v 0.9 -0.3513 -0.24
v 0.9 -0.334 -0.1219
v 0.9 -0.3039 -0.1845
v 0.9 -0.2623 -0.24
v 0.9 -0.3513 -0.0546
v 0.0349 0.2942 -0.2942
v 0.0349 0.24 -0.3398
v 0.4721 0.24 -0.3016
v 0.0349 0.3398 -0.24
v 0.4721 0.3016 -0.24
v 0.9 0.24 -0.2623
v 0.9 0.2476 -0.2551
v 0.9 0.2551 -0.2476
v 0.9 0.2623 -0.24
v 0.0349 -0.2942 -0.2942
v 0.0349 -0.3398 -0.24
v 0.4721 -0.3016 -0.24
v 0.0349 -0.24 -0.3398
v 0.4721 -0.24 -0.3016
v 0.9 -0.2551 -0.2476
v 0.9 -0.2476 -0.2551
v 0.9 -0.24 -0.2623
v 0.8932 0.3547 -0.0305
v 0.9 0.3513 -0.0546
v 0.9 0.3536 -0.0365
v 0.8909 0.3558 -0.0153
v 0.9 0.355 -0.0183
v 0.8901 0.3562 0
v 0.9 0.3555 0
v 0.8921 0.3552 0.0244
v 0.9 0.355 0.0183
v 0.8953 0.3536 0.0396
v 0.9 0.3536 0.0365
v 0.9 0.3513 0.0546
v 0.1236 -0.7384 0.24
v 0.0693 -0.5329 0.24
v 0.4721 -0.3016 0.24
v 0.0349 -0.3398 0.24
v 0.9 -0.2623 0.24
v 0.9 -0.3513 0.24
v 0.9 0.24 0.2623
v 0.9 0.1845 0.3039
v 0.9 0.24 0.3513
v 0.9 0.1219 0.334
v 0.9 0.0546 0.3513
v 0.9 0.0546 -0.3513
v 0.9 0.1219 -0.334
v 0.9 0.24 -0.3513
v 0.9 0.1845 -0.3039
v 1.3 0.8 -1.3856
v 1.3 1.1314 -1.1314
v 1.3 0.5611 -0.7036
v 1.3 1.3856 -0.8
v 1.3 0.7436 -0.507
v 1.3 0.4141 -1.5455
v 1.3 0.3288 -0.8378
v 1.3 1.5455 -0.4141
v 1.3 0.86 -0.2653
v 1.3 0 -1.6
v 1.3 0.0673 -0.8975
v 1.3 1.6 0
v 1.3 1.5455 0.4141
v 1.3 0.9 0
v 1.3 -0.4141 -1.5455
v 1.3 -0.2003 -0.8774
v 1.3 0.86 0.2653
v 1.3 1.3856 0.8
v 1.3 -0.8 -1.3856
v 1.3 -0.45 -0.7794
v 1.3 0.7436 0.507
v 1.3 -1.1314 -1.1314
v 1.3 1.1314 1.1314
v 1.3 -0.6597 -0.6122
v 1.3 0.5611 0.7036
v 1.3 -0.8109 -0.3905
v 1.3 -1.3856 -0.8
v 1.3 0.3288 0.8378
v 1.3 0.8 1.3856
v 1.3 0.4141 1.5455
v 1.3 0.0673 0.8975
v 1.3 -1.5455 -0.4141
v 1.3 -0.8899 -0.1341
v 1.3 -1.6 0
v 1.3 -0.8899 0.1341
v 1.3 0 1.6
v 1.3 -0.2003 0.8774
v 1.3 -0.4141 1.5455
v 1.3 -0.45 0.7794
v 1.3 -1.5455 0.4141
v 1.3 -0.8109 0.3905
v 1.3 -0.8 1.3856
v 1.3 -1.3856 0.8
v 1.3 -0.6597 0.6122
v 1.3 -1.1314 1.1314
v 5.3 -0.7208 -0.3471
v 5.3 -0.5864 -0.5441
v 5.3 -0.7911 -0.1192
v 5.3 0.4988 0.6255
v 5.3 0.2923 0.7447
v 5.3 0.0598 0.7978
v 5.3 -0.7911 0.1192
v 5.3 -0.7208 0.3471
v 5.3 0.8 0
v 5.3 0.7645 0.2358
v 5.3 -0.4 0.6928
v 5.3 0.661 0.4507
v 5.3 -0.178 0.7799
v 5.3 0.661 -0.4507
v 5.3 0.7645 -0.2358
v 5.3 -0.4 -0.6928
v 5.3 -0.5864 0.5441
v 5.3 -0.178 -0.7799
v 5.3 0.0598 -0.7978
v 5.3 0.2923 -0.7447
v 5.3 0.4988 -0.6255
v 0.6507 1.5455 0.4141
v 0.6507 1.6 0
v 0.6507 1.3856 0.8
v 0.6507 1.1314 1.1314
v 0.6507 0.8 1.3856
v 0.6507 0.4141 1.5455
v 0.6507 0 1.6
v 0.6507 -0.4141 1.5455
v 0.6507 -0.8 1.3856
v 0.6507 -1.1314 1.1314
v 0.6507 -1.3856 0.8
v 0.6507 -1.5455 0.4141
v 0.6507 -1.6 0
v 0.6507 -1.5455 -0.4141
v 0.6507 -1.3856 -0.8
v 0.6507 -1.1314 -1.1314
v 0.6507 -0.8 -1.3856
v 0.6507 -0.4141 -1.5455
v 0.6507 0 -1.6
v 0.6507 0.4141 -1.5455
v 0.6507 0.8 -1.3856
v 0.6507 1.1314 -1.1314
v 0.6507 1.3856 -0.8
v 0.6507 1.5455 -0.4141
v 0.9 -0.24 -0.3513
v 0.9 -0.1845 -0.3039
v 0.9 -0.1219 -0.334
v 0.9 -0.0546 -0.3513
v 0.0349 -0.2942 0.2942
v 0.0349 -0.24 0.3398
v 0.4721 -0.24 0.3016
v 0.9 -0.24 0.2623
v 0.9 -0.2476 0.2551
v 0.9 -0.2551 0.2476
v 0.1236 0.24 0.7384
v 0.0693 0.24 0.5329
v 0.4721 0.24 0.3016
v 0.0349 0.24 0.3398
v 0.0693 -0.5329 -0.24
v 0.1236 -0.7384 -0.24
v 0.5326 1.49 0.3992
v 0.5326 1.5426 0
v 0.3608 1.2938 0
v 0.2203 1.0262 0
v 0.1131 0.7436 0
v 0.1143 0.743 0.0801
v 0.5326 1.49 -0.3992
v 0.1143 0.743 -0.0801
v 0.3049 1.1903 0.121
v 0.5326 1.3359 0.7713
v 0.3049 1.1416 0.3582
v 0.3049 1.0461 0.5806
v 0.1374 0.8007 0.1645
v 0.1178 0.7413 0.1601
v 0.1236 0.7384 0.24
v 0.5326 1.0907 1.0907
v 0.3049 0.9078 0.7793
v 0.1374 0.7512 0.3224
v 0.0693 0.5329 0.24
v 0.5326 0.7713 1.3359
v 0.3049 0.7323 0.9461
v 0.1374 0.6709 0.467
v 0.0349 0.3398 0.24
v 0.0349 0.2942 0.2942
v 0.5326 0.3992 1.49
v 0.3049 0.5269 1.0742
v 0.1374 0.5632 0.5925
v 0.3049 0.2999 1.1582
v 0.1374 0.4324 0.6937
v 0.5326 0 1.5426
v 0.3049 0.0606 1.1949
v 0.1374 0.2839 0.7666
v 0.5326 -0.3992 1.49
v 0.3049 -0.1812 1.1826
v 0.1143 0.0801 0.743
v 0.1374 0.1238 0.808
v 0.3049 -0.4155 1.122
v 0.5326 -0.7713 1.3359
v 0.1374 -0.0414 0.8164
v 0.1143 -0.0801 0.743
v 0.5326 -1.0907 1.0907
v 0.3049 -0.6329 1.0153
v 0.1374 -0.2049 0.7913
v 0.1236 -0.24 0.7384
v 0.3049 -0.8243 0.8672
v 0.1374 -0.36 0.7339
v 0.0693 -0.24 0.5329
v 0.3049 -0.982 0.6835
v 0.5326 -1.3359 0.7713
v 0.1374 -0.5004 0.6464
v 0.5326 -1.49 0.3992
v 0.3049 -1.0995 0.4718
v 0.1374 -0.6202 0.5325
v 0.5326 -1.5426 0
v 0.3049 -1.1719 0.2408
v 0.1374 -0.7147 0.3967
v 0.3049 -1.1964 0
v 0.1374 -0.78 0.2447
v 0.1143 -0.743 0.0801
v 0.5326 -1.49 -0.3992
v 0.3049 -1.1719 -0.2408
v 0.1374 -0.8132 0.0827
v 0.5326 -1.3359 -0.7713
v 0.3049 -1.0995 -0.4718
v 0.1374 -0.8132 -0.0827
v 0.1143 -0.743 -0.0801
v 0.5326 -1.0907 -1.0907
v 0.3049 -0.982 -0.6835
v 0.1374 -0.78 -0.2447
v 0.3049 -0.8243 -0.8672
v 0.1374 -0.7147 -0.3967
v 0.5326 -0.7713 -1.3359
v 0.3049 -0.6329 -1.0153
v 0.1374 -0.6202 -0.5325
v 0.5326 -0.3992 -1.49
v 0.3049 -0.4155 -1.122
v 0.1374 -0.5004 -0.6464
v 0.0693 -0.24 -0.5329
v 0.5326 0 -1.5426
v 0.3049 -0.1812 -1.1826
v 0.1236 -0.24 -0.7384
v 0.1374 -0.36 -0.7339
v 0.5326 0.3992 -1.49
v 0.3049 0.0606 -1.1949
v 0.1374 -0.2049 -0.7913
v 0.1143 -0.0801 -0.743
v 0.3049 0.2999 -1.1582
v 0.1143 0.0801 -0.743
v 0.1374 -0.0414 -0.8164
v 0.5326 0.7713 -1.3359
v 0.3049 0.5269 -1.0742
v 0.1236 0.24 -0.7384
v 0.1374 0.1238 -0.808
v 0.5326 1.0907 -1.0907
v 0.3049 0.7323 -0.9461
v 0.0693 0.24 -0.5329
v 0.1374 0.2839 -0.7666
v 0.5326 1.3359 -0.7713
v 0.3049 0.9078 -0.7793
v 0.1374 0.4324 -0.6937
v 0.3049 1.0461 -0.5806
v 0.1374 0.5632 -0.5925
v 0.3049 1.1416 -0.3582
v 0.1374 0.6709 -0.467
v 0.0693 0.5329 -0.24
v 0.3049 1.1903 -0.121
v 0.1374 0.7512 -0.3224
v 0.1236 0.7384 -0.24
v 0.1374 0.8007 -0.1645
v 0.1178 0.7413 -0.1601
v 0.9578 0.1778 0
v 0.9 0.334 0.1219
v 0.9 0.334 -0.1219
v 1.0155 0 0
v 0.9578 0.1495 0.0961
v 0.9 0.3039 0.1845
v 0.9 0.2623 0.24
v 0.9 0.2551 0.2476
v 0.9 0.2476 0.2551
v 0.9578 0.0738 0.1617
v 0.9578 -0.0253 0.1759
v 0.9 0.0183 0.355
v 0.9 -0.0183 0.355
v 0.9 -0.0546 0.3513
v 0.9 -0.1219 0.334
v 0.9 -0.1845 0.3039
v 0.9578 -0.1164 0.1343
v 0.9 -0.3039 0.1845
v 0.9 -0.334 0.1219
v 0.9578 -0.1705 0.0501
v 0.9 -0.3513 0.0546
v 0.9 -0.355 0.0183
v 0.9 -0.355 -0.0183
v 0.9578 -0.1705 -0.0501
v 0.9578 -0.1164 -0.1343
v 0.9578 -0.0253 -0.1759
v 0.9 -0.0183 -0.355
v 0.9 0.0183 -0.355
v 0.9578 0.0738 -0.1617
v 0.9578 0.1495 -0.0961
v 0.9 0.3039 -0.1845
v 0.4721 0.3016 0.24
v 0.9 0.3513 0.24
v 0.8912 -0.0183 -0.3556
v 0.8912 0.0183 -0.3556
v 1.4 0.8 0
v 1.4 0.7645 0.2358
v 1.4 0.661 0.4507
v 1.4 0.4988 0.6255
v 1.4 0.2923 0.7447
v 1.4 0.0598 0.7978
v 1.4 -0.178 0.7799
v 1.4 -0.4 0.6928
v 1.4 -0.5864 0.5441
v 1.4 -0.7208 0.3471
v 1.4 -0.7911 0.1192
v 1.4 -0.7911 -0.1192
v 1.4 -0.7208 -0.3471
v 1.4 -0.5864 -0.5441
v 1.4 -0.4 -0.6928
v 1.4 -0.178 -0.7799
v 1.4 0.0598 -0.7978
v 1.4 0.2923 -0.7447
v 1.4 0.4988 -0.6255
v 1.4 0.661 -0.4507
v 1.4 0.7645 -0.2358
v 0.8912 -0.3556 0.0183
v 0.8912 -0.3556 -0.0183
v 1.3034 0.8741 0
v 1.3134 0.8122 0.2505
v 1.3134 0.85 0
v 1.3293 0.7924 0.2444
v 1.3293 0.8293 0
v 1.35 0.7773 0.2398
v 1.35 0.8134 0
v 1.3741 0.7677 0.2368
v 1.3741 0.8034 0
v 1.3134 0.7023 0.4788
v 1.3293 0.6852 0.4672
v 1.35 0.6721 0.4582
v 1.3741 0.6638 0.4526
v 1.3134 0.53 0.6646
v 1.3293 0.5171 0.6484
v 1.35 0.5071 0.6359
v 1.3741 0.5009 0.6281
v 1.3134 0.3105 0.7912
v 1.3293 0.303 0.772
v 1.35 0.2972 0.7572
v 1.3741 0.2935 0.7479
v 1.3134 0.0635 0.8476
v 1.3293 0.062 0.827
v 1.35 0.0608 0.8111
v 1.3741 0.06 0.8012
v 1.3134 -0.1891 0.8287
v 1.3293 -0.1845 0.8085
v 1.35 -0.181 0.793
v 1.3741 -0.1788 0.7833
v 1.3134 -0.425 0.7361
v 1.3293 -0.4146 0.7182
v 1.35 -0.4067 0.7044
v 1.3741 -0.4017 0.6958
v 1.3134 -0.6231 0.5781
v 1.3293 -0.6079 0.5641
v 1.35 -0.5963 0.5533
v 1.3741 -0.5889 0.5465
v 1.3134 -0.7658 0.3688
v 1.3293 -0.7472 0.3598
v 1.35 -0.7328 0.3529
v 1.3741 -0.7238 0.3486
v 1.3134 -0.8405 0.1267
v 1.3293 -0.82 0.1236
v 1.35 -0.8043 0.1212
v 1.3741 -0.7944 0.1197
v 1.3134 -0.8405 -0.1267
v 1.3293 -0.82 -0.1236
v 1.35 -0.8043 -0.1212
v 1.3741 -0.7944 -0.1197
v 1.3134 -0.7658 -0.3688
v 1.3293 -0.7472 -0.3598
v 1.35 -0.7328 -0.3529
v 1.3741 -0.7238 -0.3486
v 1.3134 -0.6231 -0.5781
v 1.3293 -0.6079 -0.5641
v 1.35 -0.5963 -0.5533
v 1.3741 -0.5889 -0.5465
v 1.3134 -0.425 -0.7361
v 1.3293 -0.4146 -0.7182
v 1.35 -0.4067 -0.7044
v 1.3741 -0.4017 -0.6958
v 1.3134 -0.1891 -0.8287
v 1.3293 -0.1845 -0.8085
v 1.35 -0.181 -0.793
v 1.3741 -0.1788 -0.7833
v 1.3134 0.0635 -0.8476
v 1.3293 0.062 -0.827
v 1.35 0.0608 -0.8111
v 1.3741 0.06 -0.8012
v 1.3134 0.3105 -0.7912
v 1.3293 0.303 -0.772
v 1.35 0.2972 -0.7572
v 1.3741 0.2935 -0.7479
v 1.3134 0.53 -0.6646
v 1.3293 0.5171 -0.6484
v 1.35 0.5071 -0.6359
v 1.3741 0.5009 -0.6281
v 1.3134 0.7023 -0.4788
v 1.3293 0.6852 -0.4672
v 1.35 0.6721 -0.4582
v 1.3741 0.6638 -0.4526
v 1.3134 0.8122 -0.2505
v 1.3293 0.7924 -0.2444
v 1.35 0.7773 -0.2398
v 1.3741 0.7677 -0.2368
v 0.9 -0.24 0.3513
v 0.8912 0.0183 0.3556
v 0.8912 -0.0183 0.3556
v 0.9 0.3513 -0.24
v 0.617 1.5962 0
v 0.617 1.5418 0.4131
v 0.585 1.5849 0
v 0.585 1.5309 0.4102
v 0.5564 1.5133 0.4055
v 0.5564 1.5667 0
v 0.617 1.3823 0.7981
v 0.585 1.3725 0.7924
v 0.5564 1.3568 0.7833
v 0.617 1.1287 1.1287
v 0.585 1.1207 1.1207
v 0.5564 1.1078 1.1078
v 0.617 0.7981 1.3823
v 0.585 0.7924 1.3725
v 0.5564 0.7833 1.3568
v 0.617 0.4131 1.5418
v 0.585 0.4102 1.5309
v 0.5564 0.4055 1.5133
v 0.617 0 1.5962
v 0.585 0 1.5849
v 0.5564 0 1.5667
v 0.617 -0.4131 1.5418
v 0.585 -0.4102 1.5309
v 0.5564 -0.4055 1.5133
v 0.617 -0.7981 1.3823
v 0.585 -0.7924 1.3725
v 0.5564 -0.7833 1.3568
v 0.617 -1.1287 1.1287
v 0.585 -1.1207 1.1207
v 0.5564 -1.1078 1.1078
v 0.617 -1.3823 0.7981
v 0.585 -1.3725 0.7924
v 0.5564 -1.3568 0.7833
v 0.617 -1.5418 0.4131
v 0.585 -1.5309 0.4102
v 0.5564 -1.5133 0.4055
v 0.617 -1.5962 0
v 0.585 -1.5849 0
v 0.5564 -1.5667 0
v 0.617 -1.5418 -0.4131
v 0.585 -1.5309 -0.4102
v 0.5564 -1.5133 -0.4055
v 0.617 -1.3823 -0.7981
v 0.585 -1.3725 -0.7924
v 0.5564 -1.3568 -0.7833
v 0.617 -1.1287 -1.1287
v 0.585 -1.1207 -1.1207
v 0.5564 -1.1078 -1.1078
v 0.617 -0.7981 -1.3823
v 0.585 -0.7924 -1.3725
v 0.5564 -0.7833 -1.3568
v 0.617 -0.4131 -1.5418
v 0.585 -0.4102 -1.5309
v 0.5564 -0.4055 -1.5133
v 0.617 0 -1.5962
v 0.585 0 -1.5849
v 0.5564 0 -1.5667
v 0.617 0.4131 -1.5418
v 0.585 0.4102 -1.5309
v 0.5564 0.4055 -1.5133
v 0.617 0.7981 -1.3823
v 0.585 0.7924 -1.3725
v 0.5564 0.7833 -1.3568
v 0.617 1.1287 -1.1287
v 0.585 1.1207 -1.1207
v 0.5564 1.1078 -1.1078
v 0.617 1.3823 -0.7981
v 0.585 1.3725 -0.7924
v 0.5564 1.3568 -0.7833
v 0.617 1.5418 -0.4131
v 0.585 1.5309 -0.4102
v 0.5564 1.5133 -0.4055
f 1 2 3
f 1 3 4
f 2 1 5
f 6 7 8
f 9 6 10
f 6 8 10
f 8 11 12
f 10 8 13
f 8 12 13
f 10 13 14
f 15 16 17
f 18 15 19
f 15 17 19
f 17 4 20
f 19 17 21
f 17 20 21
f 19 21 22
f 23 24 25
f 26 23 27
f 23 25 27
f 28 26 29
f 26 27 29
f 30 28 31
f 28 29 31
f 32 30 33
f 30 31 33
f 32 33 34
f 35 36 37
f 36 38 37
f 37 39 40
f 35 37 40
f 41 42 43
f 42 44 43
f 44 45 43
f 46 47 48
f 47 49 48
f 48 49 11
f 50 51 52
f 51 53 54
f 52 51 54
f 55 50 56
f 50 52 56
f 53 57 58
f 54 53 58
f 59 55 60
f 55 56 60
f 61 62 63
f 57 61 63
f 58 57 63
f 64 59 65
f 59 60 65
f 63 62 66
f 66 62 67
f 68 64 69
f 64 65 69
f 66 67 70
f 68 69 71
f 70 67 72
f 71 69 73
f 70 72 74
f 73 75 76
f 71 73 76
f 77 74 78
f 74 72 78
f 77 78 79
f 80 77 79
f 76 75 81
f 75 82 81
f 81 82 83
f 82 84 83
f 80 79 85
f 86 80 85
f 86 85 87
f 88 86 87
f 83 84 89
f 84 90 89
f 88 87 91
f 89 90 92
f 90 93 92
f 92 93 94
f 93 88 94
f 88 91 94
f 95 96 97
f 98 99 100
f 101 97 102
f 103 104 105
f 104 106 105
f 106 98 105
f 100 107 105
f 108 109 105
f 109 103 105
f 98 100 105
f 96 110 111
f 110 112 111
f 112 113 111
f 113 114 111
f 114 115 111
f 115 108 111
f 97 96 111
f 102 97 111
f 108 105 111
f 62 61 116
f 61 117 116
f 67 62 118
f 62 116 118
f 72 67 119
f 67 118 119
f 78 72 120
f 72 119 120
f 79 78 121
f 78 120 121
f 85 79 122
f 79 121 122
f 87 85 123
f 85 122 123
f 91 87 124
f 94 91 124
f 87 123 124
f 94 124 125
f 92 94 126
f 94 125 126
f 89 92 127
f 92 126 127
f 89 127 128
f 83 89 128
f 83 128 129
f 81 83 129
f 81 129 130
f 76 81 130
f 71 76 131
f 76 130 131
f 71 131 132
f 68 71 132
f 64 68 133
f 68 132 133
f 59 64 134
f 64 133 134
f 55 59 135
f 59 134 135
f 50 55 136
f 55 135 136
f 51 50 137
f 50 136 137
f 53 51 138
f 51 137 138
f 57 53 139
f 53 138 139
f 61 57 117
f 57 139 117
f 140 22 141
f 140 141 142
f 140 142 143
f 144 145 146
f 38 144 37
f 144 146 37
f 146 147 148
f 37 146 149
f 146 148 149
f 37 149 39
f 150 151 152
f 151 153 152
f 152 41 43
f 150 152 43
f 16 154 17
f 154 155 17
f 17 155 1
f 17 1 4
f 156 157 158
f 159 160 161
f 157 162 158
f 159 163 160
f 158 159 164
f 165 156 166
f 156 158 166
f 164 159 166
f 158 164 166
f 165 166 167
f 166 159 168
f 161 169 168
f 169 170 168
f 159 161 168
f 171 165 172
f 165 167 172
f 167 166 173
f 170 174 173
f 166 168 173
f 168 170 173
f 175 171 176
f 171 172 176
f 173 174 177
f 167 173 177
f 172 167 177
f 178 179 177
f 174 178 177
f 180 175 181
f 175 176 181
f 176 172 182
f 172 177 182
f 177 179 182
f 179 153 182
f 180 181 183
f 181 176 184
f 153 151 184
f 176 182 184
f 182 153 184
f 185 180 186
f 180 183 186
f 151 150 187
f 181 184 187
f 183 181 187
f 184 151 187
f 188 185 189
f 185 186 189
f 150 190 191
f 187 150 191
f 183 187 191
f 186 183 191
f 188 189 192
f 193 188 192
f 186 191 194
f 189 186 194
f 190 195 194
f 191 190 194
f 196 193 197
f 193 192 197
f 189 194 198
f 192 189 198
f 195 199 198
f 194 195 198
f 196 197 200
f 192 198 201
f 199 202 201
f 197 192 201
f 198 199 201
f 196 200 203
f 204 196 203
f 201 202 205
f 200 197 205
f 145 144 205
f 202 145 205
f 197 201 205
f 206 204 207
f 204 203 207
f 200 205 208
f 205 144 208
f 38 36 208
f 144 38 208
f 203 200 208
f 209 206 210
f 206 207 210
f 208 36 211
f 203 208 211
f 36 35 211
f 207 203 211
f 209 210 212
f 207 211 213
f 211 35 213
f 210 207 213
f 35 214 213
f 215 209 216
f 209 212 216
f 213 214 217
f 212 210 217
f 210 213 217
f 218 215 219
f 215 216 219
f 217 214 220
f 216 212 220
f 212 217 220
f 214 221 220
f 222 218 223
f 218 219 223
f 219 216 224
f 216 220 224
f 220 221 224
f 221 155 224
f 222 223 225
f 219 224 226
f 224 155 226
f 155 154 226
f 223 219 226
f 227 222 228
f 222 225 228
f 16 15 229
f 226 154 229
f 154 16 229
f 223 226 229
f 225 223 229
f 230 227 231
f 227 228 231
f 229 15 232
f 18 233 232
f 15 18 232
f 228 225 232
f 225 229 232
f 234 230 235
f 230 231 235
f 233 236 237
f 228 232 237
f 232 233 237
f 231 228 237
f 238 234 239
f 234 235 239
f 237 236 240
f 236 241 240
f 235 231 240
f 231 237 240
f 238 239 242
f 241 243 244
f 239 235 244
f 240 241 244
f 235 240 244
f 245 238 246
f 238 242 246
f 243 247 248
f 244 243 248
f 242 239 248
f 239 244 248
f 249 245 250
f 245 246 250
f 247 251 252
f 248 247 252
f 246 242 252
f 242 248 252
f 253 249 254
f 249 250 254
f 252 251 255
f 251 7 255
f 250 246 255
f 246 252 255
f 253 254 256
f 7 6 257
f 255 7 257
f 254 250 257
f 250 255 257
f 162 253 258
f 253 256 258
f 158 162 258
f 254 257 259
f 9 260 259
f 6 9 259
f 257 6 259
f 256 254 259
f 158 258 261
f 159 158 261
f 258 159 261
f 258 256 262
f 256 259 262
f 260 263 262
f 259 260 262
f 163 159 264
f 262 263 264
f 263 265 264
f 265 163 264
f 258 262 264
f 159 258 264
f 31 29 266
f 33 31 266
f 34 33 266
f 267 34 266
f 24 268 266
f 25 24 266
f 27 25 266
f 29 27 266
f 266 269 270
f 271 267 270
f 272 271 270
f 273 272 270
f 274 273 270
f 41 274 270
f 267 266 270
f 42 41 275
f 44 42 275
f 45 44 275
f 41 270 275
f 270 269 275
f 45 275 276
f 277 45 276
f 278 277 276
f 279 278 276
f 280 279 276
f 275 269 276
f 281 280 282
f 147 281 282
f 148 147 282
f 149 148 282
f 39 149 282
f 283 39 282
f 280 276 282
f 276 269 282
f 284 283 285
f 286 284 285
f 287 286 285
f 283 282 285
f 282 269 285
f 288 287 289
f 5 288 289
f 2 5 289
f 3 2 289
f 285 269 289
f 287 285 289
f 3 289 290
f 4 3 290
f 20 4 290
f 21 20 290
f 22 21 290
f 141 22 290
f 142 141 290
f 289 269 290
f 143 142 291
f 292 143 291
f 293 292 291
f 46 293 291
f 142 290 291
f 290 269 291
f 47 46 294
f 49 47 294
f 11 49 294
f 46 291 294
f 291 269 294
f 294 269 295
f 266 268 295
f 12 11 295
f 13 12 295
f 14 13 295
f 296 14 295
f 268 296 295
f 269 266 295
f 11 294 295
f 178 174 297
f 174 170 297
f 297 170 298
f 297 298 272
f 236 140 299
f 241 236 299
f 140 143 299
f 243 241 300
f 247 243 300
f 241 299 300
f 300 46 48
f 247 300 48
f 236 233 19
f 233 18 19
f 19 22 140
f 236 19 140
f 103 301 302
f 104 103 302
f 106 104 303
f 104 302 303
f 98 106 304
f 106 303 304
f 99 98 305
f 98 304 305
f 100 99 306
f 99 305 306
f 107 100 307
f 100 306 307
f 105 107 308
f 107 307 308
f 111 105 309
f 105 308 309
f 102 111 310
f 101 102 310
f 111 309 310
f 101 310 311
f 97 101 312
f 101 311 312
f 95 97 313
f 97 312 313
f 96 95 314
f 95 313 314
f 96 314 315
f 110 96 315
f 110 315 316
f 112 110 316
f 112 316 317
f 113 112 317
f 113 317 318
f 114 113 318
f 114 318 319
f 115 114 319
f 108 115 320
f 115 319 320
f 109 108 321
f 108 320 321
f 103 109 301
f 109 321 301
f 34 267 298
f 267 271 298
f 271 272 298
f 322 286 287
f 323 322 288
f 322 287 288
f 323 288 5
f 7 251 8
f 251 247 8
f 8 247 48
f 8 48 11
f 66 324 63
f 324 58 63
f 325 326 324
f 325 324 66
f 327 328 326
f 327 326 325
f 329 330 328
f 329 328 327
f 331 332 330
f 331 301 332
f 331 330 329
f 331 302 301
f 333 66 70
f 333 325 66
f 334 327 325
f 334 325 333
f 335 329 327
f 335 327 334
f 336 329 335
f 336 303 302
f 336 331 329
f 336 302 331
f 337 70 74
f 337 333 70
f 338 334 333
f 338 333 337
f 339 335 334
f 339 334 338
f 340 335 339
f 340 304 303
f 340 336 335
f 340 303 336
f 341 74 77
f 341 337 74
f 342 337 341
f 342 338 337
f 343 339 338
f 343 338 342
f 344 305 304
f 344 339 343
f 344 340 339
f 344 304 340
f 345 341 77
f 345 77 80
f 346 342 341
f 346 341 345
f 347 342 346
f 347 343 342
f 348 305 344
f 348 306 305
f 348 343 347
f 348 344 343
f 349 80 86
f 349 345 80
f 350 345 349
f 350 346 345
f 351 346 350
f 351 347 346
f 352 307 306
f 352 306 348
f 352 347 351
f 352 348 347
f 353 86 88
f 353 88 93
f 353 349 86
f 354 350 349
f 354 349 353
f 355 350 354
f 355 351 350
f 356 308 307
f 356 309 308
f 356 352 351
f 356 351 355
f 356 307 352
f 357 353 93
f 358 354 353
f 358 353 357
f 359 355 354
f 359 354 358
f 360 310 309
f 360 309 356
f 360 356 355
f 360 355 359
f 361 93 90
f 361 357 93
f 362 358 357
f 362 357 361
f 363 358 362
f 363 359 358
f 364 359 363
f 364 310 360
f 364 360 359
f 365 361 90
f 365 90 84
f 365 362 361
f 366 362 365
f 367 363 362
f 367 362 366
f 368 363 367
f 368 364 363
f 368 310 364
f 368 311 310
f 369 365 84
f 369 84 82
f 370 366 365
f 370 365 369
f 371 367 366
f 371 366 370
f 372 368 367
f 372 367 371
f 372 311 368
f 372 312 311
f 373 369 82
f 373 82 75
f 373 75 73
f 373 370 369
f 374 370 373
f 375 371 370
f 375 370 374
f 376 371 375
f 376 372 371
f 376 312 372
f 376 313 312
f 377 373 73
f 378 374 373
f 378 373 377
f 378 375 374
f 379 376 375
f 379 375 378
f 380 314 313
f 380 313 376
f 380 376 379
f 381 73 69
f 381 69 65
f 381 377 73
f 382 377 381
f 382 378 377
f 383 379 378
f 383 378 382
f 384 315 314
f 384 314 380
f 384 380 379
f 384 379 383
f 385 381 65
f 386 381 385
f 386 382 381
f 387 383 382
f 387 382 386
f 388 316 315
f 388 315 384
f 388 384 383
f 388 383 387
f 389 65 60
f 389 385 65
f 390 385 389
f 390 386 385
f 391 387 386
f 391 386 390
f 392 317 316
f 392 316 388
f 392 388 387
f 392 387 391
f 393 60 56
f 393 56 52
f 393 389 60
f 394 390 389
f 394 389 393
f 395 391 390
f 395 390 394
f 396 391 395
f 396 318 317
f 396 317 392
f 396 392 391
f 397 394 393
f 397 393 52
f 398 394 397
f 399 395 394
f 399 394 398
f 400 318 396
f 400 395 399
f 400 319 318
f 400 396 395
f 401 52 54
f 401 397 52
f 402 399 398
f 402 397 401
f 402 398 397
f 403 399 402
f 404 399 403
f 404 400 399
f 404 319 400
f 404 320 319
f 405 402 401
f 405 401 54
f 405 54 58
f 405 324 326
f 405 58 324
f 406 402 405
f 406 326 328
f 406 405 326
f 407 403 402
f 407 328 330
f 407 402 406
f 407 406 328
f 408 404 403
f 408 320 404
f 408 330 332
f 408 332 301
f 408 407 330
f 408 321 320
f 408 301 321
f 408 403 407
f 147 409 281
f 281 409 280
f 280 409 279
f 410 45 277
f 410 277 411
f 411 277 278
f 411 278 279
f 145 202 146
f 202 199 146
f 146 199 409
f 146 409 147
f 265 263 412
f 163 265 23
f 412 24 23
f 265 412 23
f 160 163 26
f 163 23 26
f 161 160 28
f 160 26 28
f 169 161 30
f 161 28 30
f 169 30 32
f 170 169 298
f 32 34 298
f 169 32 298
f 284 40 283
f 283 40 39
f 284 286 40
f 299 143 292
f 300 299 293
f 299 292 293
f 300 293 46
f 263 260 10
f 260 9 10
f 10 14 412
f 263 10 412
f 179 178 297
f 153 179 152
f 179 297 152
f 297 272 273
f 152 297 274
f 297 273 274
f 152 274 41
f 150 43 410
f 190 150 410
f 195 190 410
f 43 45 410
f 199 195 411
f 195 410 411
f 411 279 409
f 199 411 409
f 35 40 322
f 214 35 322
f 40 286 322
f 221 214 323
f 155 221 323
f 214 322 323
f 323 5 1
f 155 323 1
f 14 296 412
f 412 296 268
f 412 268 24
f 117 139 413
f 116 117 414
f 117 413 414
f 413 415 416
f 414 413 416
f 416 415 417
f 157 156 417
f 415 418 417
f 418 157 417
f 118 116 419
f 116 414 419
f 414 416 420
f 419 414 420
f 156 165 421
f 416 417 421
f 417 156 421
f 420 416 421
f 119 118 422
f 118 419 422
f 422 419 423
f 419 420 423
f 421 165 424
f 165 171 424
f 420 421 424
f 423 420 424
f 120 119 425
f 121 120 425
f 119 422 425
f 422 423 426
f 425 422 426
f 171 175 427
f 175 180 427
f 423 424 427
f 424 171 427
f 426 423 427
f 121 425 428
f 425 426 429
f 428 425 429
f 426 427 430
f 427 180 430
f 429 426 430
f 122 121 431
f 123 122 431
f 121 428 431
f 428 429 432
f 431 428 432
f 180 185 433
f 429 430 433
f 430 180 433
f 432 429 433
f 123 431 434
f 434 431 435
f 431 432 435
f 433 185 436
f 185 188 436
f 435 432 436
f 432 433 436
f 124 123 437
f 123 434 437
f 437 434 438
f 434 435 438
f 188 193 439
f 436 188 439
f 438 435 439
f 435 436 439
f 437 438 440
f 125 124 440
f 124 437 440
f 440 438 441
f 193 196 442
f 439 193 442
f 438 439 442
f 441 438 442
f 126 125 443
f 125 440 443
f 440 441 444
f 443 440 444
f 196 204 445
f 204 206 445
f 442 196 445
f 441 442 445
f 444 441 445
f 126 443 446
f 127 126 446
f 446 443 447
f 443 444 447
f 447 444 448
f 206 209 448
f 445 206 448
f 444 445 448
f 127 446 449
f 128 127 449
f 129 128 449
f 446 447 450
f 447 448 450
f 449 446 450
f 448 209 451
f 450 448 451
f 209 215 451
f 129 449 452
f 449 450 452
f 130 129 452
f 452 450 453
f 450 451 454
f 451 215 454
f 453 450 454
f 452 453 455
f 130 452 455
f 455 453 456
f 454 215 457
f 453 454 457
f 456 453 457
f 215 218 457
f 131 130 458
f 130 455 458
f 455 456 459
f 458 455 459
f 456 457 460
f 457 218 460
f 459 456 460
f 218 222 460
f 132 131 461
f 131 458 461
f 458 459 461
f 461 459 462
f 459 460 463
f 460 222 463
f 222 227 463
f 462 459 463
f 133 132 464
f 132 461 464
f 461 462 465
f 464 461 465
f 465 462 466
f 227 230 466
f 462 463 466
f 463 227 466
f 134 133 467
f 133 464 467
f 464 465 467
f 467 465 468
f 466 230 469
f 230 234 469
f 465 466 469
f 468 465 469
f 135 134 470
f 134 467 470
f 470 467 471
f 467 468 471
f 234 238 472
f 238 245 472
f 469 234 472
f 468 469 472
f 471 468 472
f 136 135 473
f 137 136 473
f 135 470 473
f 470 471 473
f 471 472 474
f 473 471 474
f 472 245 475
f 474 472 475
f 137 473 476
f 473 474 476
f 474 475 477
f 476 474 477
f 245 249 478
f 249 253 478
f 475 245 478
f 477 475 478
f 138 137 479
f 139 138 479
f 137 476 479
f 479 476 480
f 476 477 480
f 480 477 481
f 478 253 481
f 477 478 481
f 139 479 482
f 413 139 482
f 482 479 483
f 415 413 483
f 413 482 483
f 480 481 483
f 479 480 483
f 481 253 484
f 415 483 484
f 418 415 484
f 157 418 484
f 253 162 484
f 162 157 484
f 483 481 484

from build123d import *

# Parameters (mm, degrees)
FILLET1_R    = 0.1
SKETCH3_W    = 0.48
SKETCH3_H    = 1.6
SKETCH4_W    = 0.48
SKETCH4_H    = 0.702553256
RECPAT_COUNT = 2
RECPAT_ANGLE = 90


with BuildPart() as part:
    # BodySke → Base-Revolve (revolve)
    with BuildSketch(Plane.XY):
        with BuildLine():
            Line((1.3, 0.8), (1.3, 1.6))
            Line((1.3, 1.6), (0.650675799, 1.6))
            ThreePointArc((0.650675799, 1.6), (0.585036553, 1.584875829), (0.532633829, 1.542553191))
            ThreePointArc((0.532633829, 1.542553191), (0.136907172, 0.815960959), (0, 0))
            Line((0, 0), (5.3, 0))
            Line((5.3, 0), (5.3, 0.8))
            Line((5.3, 0.8), (1.3, 0.8))
        make_face()
    revolve(axis=Axis((-25.4, 0, 0), (1, 0, 0)))

    # Fillet1
    fillet1_edges = [part.edges().sort_by_distance(p)[0] for p in [
        (1.3, -0.8, 0),
    ]]
    fillet(fillet1_edges, radius=FILLET1_R)

    # Sketch3 → Recess section 0
    with BuildSketch(Plane(origin=(0, 0, 0), x_dir=(0, 0, -1), z_dir=(1, 0, 0))):
        Rectangle(SKETCH3_W, SKETCH3_H)
    # Sketch4 → Recess section 1
    with BuildSketch(Plane(origin=(0.9, 0, 0), x_dir=(0, 0, -1), z_dir=(1, 0, 0))):
        Rectangle(SKETCH4_W, SKETCH4_H)
    recess = loft(mode=Mode.SUBTRACT)

    # RecPat: Recess ×2 about axis
    recpat_axis = Axis((0, 0, 0), (1, 0, 0))
    for i in range(1, RECPAT_COUNT):
        add(recess.rotate(recpat_axis, i * RECPAT_ANGLE / (RECPAT_COUNT - 1)), mode=Mode.SUBTRACT)

    # RecCorSke → RecessCore (revolve, cut)
    with BuildSketch(Plane.XY):
        Polygon((0, 0), (0, 0.418434131), (0.9, 0.3555), (1.015508952, 0), align=None)
    revolve(axis=Axis((-3.175, 0, 0), (1, 0, 0)), mode=Mode.SUBTRACT)


solid = part.part
